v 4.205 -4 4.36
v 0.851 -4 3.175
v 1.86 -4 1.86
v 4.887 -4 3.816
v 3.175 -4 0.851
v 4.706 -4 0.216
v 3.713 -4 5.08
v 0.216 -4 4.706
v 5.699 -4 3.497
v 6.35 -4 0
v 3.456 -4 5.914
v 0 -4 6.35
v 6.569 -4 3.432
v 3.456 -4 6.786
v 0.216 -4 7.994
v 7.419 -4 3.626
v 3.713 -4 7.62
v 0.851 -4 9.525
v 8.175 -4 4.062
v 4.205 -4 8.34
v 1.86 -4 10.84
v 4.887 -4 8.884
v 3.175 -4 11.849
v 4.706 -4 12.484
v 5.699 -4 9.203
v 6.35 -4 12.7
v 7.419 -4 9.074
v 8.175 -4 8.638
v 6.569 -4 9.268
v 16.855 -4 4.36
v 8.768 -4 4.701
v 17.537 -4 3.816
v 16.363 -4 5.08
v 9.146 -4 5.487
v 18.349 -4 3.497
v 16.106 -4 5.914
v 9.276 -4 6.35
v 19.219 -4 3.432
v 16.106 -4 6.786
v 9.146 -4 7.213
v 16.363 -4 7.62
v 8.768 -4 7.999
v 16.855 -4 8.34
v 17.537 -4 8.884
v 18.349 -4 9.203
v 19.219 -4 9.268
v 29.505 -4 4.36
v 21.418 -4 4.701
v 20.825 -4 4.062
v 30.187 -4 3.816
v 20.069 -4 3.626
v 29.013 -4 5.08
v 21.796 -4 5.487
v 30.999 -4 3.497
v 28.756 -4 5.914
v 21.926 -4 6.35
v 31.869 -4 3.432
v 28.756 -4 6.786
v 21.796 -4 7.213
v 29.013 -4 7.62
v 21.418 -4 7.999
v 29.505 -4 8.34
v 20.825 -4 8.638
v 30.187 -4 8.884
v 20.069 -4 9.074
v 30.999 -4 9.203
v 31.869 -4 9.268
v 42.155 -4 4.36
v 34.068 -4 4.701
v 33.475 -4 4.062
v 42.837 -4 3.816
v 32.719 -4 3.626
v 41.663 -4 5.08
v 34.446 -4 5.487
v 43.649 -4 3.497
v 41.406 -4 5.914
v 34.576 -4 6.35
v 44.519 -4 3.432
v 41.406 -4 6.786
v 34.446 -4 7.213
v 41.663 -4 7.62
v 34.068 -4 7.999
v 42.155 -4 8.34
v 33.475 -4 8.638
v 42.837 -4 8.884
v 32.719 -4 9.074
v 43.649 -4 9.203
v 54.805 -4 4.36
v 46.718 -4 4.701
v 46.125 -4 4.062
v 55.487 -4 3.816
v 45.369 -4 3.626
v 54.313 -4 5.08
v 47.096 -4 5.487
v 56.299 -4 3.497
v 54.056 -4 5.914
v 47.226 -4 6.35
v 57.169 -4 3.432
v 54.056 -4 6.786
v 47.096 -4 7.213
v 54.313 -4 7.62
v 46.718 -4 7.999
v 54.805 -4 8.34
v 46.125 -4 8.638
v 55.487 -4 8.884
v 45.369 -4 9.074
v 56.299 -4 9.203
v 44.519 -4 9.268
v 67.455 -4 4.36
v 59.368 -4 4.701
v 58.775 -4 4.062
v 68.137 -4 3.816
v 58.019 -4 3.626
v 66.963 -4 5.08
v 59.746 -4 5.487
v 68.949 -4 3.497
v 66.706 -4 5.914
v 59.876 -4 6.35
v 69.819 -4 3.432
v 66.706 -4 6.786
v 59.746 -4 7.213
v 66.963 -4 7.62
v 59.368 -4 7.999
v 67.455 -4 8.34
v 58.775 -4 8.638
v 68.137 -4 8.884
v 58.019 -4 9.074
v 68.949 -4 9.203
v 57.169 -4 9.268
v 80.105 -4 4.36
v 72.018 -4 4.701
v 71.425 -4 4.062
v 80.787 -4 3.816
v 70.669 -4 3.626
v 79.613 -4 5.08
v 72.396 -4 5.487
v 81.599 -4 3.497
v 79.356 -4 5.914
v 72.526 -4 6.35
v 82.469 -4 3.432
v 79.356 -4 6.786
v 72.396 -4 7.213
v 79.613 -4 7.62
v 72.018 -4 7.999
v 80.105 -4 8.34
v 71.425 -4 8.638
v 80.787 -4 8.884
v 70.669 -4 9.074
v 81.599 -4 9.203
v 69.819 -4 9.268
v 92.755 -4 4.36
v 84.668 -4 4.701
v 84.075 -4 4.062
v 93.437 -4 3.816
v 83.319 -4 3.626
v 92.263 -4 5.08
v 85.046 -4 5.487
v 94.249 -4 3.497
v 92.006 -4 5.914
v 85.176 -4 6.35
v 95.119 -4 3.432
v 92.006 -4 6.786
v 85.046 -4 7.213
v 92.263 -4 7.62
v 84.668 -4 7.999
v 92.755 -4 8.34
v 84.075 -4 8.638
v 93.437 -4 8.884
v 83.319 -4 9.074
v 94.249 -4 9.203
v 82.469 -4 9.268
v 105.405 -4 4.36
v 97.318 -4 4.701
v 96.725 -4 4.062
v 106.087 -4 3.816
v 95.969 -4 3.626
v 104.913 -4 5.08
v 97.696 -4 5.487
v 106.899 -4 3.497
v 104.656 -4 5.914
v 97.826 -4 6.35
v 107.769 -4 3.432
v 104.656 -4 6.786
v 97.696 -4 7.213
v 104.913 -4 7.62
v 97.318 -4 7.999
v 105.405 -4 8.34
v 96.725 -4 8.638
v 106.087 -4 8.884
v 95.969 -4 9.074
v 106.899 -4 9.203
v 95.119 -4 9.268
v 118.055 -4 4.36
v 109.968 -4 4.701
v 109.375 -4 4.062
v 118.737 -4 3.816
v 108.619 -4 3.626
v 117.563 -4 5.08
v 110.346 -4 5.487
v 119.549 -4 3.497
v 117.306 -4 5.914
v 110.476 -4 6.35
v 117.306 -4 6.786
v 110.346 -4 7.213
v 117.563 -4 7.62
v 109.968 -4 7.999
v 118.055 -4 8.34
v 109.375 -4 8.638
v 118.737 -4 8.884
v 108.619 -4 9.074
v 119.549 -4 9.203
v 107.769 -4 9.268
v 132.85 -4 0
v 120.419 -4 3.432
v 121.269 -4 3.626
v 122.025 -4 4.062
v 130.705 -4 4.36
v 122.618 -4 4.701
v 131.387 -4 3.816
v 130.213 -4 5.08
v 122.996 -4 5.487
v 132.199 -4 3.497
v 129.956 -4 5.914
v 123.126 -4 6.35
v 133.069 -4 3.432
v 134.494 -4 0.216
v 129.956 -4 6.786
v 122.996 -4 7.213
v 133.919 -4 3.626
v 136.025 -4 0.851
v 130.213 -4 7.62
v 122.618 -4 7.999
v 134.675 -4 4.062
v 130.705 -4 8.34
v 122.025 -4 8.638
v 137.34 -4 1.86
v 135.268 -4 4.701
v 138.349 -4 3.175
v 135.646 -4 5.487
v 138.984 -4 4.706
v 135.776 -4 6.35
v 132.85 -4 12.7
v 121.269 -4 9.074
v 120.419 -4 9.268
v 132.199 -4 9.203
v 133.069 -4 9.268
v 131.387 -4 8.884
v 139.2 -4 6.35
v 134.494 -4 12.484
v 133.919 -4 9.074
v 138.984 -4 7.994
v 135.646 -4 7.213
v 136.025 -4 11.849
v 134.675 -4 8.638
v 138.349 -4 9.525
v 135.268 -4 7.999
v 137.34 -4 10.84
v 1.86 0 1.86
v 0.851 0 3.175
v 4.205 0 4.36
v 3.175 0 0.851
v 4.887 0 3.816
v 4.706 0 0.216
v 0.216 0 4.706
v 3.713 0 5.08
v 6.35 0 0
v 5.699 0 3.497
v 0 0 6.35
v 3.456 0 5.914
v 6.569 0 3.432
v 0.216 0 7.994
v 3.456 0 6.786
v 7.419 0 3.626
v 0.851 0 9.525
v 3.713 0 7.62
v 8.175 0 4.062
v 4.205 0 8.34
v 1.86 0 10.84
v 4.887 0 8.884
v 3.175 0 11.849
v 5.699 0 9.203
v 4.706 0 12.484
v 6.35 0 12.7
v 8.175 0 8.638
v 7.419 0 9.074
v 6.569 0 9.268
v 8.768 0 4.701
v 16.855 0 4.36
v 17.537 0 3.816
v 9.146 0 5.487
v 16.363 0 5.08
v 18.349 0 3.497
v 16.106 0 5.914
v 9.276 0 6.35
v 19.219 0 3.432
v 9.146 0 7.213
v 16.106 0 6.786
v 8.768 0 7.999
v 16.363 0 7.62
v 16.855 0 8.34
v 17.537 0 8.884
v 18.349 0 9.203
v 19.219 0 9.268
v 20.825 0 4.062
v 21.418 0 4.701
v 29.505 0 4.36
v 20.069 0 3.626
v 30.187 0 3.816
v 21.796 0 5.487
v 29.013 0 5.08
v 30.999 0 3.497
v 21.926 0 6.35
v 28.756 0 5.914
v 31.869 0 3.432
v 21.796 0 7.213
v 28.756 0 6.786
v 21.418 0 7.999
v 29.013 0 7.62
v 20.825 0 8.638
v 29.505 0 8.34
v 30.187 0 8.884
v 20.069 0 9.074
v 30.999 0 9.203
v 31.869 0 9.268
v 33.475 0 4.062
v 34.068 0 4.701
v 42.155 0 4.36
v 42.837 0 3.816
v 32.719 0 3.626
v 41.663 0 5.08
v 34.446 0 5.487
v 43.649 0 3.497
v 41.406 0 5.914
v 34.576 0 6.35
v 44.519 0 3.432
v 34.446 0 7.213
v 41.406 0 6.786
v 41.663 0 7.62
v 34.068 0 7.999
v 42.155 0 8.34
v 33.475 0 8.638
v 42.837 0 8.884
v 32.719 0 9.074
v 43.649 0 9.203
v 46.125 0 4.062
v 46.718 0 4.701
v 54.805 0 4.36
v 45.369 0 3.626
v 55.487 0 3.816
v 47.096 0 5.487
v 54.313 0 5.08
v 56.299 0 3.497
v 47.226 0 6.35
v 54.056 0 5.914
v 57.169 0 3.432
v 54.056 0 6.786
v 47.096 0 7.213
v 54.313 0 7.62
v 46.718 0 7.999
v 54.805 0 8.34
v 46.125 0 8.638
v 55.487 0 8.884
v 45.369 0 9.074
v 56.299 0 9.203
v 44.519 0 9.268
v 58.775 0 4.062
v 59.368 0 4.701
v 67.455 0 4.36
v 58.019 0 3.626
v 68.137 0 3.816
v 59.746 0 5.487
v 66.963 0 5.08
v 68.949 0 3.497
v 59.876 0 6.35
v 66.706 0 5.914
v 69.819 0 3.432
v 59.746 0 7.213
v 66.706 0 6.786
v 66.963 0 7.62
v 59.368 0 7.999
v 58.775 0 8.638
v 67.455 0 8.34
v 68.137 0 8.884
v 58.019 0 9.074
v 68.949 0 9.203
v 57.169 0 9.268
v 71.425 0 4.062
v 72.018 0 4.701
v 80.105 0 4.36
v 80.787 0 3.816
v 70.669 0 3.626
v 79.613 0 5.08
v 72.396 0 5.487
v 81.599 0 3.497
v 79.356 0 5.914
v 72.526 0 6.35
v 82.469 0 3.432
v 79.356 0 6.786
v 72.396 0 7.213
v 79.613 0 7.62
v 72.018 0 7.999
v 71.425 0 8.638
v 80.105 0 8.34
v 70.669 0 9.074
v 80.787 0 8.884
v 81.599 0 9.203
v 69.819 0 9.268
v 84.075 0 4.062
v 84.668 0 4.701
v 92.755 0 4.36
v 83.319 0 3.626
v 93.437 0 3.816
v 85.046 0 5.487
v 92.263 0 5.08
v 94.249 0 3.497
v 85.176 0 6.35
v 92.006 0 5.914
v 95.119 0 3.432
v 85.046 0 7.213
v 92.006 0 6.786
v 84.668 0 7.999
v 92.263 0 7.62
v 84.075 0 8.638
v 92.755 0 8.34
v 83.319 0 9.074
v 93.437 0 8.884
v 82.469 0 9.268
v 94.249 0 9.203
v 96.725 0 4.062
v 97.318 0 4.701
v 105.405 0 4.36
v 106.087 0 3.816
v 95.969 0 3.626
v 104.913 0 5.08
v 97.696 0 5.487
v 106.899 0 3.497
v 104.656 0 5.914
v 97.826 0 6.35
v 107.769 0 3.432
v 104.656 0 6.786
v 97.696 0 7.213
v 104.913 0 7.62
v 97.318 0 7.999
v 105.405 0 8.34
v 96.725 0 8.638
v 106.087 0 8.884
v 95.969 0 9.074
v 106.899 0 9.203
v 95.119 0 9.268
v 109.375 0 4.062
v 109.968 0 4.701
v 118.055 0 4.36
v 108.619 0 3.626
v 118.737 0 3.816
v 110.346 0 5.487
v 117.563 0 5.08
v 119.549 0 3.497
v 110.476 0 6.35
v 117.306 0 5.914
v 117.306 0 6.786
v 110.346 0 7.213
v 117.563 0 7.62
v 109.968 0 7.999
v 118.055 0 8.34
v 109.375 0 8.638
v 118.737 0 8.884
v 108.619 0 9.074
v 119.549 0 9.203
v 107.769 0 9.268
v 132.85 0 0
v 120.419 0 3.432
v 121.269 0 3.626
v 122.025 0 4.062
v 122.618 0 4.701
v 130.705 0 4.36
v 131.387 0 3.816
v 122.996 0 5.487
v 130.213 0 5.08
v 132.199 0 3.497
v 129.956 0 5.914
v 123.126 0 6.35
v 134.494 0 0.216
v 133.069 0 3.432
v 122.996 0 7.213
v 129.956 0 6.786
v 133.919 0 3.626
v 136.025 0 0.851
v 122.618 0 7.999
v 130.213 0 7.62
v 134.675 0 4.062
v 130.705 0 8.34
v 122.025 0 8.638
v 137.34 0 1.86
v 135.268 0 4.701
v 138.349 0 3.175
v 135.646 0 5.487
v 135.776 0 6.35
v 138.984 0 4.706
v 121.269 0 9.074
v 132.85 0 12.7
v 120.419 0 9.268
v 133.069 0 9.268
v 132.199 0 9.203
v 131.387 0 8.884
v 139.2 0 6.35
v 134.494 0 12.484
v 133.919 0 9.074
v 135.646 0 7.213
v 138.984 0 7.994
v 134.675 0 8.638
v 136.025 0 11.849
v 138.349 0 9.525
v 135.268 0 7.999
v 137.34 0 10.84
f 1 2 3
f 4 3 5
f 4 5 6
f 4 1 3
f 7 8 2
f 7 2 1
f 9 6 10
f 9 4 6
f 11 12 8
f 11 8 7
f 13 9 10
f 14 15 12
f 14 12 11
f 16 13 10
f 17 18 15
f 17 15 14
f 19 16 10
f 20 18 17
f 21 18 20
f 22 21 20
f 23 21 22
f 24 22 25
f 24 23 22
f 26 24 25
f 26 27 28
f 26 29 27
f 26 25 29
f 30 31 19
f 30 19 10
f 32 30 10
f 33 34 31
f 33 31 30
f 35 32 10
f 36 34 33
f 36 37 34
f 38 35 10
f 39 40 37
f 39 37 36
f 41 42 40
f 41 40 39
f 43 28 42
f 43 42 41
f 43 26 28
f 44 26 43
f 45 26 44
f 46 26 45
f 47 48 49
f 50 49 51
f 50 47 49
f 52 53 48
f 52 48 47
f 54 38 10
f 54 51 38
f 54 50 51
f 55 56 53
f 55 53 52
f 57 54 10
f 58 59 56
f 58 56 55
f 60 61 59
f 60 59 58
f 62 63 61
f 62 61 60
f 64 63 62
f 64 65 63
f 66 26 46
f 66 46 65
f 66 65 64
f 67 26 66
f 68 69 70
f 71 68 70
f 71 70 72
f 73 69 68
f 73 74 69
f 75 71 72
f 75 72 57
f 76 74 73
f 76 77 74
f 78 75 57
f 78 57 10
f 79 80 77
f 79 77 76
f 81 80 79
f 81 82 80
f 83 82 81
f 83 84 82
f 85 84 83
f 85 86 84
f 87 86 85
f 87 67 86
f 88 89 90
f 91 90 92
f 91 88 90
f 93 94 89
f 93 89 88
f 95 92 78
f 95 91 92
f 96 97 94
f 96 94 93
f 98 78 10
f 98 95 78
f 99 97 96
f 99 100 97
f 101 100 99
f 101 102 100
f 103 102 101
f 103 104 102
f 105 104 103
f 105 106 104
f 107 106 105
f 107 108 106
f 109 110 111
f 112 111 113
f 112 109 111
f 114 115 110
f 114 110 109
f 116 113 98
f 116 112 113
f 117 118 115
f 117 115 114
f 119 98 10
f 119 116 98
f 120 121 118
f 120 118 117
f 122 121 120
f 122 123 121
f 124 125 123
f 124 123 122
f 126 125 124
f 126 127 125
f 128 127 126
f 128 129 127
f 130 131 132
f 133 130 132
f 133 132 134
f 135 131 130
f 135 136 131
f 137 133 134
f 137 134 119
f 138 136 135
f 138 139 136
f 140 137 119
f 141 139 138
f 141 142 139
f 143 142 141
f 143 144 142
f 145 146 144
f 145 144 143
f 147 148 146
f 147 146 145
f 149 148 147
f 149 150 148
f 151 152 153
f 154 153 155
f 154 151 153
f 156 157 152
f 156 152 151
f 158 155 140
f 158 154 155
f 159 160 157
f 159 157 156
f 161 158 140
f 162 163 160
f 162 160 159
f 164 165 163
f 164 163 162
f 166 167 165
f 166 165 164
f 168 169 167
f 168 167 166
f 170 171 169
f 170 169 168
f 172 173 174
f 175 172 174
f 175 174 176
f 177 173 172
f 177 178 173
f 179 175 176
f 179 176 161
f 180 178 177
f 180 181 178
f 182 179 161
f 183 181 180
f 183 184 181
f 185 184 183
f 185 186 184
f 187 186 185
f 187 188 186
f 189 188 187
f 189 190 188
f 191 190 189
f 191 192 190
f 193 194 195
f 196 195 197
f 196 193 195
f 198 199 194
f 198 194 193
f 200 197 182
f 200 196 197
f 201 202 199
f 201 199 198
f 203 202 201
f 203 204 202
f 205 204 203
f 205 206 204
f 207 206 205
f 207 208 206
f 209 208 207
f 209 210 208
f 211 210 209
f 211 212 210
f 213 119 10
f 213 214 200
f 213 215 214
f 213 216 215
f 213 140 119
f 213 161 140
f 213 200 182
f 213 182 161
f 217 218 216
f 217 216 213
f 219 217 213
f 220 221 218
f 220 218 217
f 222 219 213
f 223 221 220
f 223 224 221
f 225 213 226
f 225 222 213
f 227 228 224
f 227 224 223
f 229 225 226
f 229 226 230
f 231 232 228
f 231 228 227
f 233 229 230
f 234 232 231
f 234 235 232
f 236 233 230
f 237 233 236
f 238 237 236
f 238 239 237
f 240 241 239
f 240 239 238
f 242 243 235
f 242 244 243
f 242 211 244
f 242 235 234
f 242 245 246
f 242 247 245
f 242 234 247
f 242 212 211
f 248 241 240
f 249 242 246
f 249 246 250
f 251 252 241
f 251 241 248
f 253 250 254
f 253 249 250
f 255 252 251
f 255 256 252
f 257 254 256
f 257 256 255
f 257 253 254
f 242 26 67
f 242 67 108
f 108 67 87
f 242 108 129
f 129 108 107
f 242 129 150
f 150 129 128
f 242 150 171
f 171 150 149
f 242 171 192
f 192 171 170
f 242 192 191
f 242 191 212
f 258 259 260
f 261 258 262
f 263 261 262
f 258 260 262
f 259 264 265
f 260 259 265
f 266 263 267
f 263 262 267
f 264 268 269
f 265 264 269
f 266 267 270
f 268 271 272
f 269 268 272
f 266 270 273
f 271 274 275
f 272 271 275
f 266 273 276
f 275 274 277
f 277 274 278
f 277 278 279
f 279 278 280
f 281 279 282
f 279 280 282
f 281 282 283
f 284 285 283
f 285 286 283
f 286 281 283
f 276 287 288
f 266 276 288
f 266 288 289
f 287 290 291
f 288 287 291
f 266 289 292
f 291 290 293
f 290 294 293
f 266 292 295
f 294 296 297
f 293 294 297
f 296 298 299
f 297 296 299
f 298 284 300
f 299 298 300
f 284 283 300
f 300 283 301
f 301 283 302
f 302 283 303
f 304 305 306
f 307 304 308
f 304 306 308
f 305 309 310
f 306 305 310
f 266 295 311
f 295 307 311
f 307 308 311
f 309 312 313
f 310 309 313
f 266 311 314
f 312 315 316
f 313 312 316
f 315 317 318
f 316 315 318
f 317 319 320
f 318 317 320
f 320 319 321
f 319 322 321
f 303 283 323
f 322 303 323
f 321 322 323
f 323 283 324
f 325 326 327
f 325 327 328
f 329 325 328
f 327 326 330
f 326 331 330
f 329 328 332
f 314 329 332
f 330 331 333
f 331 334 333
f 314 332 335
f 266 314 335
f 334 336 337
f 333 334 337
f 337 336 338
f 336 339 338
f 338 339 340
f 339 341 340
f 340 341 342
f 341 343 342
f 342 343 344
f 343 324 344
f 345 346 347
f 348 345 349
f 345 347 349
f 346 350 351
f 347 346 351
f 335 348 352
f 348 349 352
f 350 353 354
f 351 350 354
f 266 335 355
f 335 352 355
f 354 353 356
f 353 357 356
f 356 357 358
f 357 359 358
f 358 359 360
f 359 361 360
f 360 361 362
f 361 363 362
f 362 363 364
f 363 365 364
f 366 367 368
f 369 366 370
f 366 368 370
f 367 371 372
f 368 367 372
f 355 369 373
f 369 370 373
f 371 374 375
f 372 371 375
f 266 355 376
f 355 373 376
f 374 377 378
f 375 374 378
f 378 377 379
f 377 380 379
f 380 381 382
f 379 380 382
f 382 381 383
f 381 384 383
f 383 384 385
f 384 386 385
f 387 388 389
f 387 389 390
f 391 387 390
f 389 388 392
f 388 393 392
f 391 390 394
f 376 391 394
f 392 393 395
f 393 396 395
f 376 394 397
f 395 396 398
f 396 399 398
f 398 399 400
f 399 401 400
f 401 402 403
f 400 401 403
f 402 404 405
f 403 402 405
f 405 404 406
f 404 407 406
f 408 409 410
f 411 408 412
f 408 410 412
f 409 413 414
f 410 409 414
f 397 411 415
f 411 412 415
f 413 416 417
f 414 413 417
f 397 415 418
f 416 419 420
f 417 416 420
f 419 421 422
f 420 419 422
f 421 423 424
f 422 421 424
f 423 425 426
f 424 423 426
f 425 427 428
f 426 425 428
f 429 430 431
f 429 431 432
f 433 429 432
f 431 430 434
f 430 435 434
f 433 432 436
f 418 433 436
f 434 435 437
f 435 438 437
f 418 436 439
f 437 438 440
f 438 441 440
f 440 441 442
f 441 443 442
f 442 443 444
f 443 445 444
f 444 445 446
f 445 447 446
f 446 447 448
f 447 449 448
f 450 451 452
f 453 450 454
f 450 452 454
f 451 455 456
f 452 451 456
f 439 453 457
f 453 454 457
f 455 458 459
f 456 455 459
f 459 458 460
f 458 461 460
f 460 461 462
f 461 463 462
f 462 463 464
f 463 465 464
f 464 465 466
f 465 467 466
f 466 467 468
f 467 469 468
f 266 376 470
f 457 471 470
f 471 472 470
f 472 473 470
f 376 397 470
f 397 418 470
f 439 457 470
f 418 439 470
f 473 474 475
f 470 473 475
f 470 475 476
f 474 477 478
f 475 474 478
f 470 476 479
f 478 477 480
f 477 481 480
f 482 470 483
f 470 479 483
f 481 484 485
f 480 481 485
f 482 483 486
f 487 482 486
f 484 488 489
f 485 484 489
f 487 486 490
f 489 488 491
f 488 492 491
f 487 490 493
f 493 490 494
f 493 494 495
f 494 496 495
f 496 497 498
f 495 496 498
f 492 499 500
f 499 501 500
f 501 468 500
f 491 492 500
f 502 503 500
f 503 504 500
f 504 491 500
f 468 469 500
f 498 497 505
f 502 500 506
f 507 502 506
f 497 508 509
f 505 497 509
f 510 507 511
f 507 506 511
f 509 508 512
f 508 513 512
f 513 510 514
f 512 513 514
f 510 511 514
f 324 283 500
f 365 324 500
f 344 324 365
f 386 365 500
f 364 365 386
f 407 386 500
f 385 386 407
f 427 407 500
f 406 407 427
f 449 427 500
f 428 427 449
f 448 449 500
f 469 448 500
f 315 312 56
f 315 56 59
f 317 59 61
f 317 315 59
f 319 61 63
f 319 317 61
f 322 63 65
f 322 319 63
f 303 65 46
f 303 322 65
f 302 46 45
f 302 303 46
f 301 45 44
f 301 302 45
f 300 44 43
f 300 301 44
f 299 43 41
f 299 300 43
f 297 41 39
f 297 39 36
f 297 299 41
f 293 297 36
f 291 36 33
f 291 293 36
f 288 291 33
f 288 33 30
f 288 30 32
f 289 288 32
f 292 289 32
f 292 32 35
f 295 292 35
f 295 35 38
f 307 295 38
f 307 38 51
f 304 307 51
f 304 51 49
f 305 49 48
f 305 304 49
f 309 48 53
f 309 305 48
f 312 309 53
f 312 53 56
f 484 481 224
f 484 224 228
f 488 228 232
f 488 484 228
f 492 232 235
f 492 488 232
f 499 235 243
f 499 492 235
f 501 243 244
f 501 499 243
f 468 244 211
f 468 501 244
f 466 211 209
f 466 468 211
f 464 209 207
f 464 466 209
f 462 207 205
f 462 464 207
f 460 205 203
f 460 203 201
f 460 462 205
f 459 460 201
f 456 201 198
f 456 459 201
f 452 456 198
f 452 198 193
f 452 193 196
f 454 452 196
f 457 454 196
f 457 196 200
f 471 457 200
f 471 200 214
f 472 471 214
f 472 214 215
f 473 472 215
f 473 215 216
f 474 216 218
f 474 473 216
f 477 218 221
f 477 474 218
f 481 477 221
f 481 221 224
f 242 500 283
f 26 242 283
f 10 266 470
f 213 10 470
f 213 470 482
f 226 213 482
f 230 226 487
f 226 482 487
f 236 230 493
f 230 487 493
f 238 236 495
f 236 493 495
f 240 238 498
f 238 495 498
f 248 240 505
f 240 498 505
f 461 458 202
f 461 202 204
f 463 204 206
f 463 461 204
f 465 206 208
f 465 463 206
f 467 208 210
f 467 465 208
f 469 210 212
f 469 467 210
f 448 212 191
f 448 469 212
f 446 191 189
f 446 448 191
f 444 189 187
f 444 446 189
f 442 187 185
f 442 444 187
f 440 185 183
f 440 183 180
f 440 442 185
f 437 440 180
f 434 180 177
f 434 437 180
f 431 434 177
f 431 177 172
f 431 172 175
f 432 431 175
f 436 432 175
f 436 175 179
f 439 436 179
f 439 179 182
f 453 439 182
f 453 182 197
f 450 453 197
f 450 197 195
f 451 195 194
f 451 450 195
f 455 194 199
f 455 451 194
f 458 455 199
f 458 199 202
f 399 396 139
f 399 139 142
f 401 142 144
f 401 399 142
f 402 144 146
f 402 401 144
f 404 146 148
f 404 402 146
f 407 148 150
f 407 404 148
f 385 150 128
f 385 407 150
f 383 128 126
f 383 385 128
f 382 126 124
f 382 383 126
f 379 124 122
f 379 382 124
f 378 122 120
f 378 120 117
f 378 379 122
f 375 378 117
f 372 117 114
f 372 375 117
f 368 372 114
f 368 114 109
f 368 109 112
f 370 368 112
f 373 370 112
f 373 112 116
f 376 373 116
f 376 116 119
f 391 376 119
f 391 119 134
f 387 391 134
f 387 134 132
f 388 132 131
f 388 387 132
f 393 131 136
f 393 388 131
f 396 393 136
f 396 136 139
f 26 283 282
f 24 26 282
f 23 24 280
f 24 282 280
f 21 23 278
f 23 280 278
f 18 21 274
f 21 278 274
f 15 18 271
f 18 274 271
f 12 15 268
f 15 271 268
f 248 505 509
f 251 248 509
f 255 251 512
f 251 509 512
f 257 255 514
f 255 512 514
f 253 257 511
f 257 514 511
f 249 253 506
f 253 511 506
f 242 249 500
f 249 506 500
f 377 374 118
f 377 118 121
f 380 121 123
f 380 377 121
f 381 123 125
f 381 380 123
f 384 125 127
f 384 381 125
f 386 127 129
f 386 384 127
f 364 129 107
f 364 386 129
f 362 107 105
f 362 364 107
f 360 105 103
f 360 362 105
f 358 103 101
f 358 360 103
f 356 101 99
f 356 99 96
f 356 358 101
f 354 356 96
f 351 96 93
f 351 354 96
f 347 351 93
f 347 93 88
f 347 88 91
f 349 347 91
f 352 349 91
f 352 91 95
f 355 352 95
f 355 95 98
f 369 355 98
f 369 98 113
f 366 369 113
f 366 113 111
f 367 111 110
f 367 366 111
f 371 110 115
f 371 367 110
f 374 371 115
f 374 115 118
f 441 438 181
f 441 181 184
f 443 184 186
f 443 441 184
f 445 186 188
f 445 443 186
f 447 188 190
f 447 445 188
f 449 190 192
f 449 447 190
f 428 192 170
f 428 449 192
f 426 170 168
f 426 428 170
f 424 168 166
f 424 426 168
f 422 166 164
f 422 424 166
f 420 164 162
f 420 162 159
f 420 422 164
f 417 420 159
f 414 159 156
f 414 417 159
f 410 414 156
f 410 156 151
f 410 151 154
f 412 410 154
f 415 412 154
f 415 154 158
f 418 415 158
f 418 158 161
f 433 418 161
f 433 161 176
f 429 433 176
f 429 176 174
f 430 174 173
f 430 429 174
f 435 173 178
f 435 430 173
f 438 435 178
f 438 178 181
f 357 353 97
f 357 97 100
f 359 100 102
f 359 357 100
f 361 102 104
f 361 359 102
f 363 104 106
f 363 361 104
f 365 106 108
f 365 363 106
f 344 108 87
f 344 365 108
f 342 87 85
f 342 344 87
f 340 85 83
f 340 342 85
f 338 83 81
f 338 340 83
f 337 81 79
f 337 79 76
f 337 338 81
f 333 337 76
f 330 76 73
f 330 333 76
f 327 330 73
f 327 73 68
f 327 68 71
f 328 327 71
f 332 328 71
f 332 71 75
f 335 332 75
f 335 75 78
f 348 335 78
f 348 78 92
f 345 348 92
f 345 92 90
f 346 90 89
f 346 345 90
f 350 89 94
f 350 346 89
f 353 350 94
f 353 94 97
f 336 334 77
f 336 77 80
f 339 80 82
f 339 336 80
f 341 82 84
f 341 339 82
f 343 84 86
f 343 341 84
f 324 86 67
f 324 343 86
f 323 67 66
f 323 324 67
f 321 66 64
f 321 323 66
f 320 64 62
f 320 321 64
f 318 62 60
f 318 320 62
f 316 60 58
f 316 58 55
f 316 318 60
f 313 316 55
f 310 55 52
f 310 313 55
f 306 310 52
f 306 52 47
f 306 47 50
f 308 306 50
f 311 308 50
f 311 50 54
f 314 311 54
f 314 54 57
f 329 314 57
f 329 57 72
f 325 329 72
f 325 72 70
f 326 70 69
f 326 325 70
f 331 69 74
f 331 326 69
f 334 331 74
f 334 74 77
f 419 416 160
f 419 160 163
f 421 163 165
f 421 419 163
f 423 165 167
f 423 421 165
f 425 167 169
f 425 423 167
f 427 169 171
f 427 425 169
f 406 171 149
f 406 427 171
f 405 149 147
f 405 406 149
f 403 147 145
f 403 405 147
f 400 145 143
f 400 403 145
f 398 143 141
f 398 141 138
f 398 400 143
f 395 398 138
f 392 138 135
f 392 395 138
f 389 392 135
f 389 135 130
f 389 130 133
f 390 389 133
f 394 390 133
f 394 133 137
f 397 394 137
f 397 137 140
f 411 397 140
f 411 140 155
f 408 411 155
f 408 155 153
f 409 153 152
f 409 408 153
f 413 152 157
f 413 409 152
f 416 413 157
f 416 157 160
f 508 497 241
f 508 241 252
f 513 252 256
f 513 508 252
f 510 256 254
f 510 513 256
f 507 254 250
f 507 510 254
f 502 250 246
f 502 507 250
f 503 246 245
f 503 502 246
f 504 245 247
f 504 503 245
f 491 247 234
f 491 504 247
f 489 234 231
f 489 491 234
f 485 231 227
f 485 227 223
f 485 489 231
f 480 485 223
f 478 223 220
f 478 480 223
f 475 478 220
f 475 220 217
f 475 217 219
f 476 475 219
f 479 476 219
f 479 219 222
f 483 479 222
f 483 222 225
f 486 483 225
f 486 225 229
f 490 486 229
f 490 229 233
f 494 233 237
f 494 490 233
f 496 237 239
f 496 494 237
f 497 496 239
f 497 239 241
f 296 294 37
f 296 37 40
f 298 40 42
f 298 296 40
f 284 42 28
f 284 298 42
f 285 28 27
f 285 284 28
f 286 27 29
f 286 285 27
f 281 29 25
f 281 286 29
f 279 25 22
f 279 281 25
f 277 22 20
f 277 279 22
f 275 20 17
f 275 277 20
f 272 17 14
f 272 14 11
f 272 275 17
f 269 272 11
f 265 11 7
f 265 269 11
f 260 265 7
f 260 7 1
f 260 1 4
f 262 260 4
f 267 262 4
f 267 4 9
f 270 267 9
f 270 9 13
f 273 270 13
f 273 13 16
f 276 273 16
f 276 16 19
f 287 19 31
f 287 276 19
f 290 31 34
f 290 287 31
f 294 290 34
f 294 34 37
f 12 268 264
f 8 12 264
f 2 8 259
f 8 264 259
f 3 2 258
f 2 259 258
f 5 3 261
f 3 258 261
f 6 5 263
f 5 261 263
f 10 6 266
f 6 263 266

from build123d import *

# Parameters (mm, degrees)
F0_R     = 2.926405
F1_DEPTH = 4


with BuildPart() as f1:
    # F0 (on Front) → F1 (new body)
    with BuildSketch(Plane.XZ):
        with BuildLine():
            ThreePointArc((0, 6.35), (1.859872, 1.859872), (6.35, 0))
            Line((6.35, 0), (132.85, 0))
            ThreePointArc((132.85, 0), (137.340128, 1.859872), (139.2, 6.35))
            ThreePointArc((139.2, 6.35), (137.340128, 10.840128), (132.85, 12.7))
            Line((132.85, 12.7), (6.35, 12.7))
            ThreePointArc((6.35, 12.7), (1.859872, 10.840128), (0, 6.35))
        make_face()
        with Locations((6.35, 6.35)):
            Circle(F0_R, mode=Mode.SUBTRACT)
        with Locations((19, 6.35)):
            Circle(F0_R, mode=Mode.SUBTRACT)
        with Locations((31.65, 6.35)):
            Circle(F0_R, mode=Mode.SUBTRACT)
        with Locations((44.3, 6.35)):
            Circle(F0_R, mode=Mode.SUBTRACT)
        with Locations((56.95, 6.35)):
            Circle(F0_R, mode=Mode.SUBTRACT)
        with Locations((69.6, 6.35)):
            Circle(F0_R, mode=Mode.SUBTRACT)
        with Locations((82.25, 6.35)):
            Circle(F0_R, mode=Mode.SUBTRACT)
        with Locations((94.9, 6.35)):
            Circle(F0_R, mode=Mode.SUBTRACT)
        with Locations((107.55, 6.35)):
            Circle(F0_R, mode=Mode.SUBTRACT)
        with Locations((120.2, 6.35)):
            Circle(F0_R, mode=Mode.SUBTRACT)
        with Locations((132.85, 6.35)):
            Circle(F0_R, mode=Mode.SUBTRACT)
    extrude(amount=F1_DEPTH)


solid = f1.part
